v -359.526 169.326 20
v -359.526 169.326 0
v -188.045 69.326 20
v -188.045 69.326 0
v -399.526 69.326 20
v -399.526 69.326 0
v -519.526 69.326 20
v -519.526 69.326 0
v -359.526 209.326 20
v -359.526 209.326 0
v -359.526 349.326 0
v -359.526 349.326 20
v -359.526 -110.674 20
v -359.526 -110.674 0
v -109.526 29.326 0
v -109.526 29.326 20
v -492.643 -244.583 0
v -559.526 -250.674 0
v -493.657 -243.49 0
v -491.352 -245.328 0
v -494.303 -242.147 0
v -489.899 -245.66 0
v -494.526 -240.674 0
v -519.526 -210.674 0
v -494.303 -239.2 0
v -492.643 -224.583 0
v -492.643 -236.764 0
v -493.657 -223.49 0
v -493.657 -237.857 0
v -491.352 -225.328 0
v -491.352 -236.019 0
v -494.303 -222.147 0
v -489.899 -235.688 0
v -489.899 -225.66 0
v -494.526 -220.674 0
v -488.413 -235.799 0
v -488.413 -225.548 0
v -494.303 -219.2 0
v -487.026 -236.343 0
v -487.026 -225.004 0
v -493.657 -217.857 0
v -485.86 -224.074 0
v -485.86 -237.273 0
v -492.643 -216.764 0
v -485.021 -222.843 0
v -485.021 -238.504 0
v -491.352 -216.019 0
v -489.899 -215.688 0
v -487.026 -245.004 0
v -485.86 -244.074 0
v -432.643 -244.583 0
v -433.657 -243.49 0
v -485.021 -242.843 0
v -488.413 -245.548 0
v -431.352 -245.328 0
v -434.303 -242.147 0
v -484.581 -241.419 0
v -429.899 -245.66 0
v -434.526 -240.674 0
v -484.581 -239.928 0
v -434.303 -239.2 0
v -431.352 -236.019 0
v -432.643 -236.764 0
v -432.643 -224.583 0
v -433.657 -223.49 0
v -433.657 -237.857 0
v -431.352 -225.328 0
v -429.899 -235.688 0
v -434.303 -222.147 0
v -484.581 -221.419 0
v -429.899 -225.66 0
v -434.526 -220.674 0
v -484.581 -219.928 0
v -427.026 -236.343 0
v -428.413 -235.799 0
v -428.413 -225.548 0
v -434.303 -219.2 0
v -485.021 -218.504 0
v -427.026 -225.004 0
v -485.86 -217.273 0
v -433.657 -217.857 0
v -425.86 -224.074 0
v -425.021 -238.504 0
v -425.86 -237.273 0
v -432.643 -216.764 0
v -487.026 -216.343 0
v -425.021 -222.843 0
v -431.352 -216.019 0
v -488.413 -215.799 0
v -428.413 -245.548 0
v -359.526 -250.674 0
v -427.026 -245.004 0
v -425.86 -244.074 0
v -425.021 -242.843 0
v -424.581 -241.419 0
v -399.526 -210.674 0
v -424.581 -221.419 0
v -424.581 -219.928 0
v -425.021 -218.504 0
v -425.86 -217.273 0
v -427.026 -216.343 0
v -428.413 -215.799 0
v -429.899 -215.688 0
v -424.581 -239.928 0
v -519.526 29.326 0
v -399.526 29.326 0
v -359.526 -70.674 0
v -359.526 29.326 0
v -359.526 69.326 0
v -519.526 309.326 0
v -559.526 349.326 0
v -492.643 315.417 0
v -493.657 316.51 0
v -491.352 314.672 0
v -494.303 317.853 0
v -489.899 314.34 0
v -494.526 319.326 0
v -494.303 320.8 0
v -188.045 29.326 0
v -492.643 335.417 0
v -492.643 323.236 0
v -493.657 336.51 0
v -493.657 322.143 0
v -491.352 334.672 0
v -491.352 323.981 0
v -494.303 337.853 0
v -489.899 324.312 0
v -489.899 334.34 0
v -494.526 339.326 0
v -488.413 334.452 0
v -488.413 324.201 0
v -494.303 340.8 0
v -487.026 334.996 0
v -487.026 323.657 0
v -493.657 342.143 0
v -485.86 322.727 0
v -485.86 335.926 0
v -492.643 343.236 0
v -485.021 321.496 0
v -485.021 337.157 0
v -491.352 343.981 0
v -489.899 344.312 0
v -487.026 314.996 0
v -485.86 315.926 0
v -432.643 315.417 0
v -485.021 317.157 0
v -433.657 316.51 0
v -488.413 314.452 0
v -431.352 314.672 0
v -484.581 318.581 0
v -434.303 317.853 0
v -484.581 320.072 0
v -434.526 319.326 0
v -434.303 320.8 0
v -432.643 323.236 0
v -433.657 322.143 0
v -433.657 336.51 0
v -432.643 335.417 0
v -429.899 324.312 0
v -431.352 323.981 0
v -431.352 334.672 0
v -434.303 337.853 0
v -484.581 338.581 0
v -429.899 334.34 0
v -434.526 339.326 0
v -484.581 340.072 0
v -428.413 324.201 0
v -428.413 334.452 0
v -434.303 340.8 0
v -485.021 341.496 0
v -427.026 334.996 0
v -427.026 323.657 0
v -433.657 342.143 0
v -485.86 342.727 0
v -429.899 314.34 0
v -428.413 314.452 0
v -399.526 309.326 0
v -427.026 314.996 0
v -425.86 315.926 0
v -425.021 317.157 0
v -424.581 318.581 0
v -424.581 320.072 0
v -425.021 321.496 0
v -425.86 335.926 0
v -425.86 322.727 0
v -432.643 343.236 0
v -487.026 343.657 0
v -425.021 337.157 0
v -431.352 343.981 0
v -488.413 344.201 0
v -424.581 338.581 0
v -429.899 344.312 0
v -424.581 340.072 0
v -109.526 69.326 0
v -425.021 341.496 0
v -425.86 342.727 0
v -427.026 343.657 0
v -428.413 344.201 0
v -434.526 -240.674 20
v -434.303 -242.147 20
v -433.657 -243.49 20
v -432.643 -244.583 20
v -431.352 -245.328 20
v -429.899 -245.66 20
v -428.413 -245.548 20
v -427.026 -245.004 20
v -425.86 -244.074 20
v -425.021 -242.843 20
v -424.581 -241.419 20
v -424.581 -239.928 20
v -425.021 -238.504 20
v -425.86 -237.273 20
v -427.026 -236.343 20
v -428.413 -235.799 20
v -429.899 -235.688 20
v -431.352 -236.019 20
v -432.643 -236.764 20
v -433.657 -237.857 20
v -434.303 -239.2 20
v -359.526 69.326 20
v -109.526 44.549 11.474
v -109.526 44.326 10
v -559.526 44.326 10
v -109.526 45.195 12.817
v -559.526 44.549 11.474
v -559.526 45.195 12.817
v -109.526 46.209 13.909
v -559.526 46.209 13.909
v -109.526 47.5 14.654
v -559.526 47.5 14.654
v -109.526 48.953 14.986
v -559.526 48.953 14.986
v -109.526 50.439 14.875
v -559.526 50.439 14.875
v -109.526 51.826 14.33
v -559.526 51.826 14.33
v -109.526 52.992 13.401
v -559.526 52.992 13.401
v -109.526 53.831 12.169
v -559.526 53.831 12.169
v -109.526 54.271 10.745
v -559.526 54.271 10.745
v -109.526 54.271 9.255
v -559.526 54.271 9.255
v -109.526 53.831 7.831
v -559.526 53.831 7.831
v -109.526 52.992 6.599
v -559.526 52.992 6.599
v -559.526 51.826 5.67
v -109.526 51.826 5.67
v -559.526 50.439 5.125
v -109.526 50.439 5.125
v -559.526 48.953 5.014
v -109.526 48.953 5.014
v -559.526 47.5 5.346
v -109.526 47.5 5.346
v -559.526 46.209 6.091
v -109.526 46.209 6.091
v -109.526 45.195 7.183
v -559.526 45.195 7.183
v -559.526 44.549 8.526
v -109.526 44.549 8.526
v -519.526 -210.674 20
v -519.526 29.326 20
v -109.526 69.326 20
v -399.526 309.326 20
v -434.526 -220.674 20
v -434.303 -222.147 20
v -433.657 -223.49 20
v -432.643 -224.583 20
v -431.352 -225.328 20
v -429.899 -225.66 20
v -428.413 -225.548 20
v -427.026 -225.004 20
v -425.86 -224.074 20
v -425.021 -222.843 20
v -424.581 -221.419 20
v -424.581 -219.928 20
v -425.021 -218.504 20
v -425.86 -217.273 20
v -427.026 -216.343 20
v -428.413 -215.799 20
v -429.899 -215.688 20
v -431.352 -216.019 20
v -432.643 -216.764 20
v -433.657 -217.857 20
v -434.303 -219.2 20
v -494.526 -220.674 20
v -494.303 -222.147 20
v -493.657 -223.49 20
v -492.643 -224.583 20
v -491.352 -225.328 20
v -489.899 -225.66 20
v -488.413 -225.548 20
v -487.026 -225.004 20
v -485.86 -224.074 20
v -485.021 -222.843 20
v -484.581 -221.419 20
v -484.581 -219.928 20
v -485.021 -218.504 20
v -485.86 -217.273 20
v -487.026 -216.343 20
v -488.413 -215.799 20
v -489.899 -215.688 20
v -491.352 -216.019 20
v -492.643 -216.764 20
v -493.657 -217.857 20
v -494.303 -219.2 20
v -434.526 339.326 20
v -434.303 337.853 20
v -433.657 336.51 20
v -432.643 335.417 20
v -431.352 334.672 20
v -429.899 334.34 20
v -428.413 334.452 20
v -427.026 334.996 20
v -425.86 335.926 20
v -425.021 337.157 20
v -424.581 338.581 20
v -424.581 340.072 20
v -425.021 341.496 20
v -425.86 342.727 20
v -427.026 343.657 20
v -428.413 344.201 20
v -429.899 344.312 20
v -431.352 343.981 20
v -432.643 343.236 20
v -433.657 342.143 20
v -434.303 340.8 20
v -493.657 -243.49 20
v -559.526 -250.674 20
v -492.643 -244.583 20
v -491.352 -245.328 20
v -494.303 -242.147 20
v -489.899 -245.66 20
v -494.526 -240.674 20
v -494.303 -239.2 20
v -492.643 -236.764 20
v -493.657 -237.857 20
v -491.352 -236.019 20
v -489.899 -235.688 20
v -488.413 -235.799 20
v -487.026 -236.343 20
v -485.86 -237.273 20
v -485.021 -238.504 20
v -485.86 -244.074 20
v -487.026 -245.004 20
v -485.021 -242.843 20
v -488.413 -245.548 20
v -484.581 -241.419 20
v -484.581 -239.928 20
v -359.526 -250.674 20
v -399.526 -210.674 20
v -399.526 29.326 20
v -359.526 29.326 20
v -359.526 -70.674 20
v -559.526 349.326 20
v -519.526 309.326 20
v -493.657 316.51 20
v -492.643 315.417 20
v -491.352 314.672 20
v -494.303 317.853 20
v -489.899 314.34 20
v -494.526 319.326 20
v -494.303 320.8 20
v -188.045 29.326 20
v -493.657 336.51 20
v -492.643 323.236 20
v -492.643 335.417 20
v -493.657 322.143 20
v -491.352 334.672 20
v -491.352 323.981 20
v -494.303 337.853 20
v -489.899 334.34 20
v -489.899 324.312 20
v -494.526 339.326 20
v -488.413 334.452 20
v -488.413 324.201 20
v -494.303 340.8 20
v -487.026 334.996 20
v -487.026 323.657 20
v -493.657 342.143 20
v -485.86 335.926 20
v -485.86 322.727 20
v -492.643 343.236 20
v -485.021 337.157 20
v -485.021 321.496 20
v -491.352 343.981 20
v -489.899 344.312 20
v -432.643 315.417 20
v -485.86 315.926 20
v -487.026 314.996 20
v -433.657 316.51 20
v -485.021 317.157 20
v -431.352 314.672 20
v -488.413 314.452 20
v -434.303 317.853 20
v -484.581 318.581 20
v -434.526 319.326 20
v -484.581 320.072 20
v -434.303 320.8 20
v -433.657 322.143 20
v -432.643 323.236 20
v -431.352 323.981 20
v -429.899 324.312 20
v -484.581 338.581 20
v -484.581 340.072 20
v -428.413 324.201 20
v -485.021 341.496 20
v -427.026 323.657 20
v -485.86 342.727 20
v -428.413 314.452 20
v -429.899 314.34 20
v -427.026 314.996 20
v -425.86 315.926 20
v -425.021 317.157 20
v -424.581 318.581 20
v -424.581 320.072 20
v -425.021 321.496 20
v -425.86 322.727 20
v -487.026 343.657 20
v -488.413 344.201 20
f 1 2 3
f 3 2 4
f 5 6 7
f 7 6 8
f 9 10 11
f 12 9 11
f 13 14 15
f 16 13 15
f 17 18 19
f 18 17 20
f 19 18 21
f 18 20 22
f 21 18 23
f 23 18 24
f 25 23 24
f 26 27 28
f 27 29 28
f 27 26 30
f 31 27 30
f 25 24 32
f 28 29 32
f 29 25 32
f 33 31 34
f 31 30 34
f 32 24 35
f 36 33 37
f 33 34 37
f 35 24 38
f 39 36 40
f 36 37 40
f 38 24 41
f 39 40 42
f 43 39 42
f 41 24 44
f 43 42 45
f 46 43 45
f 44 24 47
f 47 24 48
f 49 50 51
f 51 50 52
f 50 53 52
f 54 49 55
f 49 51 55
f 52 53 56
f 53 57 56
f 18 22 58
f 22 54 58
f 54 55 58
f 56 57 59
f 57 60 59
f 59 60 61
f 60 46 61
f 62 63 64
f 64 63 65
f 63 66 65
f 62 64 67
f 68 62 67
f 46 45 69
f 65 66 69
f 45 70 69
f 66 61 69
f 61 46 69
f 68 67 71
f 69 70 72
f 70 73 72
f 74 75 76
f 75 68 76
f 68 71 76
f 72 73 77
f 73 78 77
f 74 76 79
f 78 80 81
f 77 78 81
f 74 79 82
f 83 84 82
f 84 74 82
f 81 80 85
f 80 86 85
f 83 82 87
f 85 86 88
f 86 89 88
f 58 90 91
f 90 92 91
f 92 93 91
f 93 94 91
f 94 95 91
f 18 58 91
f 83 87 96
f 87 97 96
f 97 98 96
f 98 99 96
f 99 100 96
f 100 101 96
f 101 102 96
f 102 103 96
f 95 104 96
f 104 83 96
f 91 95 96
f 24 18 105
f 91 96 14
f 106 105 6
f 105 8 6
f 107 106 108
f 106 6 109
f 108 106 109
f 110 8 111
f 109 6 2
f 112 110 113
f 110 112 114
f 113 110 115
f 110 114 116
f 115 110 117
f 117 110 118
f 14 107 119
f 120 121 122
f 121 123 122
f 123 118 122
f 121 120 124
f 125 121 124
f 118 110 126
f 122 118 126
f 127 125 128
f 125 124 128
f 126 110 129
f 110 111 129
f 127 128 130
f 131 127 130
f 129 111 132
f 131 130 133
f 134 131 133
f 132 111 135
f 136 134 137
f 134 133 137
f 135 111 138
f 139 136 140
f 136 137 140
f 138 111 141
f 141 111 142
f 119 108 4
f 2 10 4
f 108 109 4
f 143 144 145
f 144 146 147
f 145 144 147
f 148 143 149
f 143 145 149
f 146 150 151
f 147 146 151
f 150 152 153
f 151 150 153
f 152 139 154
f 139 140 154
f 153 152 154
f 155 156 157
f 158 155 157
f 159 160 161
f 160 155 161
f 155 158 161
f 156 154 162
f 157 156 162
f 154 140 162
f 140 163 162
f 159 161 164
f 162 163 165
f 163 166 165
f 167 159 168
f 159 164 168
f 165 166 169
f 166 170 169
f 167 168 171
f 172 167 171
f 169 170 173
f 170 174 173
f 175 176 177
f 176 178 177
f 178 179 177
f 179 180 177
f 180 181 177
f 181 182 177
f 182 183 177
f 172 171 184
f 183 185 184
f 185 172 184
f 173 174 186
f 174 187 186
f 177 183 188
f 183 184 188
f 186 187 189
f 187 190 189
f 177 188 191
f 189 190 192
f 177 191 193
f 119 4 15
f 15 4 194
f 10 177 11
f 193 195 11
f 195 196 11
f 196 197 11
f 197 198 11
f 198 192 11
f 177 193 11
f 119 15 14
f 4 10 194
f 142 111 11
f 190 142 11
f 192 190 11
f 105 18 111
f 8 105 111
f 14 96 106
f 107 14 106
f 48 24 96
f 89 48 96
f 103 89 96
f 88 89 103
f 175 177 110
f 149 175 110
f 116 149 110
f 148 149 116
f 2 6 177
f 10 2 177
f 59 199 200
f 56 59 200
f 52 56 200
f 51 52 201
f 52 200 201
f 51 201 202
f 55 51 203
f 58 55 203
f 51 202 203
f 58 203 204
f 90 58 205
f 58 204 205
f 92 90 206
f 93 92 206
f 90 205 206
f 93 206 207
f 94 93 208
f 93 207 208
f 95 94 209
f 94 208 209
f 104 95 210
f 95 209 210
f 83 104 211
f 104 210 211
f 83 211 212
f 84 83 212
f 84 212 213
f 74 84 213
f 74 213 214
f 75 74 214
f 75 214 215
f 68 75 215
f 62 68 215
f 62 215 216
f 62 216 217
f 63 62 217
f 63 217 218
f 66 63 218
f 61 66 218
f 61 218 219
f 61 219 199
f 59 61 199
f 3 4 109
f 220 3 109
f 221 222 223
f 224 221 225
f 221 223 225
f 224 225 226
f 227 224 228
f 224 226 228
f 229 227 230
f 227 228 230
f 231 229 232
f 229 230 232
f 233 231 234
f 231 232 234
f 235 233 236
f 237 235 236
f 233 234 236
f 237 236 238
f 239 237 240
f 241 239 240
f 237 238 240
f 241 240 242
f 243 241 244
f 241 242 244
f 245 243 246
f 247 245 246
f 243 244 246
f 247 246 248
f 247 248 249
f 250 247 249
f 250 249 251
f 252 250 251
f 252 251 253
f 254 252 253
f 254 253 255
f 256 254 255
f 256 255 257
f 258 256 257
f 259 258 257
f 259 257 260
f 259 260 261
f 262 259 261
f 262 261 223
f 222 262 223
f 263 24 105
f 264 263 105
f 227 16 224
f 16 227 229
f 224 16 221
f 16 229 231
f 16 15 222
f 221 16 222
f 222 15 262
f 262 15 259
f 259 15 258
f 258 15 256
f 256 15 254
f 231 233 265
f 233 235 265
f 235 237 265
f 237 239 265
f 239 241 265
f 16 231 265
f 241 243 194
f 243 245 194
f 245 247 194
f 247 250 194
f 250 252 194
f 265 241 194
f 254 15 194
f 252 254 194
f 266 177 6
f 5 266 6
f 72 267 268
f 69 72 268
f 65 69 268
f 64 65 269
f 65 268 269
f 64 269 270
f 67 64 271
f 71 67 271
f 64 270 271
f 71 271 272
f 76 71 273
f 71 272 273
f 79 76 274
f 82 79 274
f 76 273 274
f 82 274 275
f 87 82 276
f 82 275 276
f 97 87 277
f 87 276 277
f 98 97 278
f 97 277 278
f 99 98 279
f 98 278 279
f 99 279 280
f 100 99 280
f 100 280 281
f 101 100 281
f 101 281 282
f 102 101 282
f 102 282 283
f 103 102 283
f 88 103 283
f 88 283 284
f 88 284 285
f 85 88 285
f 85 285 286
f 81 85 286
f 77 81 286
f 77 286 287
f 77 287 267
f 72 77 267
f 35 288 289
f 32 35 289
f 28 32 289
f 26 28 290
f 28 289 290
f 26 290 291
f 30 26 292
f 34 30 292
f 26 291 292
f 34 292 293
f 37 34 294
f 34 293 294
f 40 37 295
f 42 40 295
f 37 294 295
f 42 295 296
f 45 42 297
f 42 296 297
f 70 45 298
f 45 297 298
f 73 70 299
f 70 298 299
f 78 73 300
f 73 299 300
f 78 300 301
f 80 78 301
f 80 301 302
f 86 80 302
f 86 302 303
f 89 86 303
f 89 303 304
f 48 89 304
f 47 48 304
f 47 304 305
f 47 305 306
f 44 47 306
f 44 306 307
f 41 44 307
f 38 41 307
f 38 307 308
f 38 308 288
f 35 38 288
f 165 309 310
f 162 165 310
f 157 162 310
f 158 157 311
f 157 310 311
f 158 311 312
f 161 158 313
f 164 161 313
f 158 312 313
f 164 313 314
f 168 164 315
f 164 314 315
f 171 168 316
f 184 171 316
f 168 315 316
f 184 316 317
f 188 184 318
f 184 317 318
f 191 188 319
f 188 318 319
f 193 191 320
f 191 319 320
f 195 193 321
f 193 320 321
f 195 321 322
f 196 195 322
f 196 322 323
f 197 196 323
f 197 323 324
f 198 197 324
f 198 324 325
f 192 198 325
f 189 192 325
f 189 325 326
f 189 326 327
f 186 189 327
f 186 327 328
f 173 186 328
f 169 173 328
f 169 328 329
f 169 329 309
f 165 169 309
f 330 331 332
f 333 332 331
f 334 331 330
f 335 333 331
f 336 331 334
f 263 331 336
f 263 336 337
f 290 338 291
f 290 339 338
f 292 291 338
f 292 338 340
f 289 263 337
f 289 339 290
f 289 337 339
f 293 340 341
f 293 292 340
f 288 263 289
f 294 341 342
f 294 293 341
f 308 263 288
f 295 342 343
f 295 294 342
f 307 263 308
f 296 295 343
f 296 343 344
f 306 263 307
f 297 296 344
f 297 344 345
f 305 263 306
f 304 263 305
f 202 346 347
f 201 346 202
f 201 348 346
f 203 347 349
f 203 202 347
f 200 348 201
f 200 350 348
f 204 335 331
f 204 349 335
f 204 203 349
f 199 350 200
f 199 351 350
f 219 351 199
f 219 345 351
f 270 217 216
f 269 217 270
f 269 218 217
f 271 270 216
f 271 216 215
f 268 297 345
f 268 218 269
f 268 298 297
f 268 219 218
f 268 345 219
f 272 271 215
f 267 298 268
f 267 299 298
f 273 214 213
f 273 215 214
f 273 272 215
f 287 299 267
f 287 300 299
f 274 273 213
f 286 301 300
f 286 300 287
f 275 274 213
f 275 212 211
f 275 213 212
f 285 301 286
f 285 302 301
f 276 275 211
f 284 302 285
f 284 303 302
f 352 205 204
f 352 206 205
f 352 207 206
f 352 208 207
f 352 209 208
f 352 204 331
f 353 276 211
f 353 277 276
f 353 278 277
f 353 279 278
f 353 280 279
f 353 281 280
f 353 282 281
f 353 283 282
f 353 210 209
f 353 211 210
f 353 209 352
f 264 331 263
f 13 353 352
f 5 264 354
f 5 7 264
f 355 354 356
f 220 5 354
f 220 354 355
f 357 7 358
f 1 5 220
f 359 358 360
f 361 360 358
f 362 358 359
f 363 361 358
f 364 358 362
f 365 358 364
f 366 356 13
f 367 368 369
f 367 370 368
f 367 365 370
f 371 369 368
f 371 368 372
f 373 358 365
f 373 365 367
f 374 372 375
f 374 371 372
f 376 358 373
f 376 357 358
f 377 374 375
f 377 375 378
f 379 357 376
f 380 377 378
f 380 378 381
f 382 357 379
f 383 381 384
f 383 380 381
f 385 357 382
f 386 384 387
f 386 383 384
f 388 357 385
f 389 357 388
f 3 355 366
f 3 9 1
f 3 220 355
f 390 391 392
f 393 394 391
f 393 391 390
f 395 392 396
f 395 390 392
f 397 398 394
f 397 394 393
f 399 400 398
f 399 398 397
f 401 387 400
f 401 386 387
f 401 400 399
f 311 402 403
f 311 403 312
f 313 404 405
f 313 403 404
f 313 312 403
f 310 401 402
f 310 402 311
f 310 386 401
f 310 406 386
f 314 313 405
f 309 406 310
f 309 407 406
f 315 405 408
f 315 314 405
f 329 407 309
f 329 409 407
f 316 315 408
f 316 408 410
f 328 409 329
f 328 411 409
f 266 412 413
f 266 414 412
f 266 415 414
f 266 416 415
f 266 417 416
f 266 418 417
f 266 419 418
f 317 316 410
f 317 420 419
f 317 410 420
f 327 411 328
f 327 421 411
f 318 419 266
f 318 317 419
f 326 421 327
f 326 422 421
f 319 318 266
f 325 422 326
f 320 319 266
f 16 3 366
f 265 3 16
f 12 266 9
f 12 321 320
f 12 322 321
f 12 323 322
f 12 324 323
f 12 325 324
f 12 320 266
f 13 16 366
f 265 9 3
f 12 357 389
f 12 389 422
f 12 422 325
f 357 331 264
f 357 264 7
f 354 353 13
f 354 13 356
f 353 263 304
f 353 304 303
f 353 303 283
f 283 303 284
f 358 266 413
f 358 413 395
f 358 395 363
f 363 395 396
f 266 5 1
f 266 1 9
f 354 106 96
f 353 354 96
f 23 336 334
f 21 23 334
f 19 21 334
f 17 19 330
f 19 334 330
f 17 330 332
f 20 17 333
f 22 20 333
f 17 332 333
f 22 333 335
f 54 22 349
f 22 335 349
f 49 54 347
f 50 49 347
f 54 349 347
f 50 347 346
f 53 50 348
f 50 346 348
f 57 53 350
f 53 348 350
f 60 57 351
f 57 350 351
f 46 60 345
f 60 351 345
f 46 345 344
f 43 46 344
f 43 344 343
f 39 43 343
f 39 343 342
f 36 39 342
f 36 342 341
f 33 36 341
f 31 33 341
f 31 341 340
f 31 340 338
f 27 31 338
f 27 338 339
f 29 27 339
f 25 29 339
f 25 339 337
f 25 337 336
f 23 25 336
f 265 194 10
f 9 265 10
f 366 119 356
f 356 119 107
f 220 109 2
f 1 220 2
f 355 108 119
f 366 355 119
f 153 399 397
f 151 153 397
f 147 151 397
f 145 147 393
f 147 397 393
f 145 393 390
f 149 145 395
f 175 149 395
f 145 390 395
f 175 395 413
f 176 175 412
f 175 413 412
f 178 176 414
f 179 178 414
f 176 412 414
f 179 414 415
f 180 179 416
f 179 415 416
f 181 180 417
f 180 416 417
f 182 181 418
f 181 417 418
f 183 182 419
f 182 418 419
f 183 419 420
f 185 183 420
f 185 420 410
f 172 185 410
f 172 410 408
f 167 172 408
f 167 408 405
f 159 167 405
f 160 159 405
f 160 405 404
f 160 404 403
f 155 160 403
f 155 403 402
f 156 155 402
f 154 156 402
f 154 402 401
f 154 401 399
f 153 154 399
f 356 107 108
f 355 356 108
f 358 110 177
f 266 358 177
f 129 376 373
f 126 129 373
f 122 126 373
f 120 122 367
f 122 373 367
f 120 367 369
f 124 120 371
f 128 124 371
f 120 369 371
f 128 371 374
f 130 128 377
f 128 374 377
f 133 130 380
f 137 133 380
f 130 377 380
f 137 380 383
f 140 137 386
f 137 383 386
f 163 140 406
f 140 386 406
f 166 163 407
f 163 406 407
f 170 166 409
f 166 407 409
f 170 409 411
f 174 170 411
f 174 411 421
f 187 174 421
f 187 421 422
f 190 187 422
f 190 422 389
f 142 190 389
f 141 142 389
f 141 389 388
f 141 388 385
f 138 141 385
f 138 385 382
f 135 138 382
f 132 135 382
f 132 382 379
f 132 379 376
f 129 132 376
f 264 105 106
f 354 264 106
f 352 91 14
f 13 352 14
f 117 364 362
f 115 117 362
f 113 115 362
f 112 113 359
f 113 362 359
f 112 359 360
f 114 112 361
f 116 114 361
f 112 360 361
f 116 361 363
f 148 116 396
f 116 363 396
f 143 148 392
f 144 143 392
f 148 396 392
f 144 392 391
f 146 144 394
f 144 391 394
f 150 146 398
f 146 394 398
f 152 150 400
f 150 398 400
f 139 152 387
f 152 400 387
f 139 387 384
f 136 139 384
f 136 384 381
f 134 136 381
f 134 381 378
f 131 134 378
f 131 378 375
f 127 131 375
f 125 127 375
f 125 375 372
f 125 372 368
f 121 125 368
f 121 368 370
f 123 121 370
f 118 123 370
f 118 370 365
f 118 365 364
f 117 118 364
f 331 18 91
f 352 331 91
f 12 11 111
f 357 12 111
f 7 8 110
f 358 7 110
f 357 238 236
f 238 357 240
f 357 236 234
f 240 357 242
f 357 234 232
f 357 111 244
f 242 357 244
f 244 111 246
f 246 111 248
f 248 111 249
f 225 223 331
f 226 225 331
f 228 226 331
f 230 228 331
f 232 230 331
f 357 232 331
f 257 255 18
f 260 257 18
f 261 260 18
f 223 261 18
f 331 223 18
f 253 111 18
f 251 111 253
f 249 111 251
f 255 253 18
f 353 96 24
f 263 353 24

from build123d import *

# Parameters (mm, degrees)
F1_DEPTH = 20
F2_D     = 10
F3_D     = 10
F0_W     = 120
F0_H     = 40
F0_W_2   = 40
F4_DEPTH = 20
F6_D     = 10


# Not quite as in the source:
# - a feature names something its author has since deleted; it is built from what else it names


with BuildPart() as f1:
    # F0 (on Top) → F1 (new body)
    with BuildSketch(Plane.XY):
        Polygon((-359.5256319247, 349.3264111251), (-559.5256319247, 349.3264111251), (-559.5256319247, -250.6735888749), (-359.5256319247, -250.6735888749), (-359.5256319247, -110.6735888749), (-359.5256319247, -70.6735888749), (-359.5256319247, 29.3264111251), (-399.5256319247, 29.3264111251), (-399.5256319247, -210.6735888749), (-519.5256319247, -210.6735888749), (-519.5256319247, 29.3264111251), (-519.5256319247, 69.3264111251), (-519.5256319247, 309.3264111251), (-399.5256319247, 309.3264111251), (-399.5256319247, 69.3264111251), (-359.5256319247, 69.3264111251), (-359.5256319247, 169.3264111251), (-359.5256319247, 209.3264111251), align=None)
    extrude(amount=F1_DEPTH)

    # F2 (through all)
    with Locations(Plane(origin=(0, 0, 0), x_dir=(1, 0, 0), z_dir=(0, 0, -1))):
        with Locations((-489.5256319247, -339.3264111251), (-429.5256319247, -319.3264111251), (-489.5256319247, -319.3264111251), (-489.5256319247, 220.6735888749), (-489.5256319247, 240.6735888749), (-429.5256319247, 240.6735888749), (-429.5256319247, 220.6735888749)):
            Hole(F2_D / 2)

    # F3 (through all)
    with Locations(Plane(origin=(0, 0, 0), x_dir=(1, 0, 0), z_dir=(0, 0, -1))):
        with Locations((-429.5256319247, -339.3264111251)):
            Hole(F3_D / 2)

    # F0 (on Top) → F4 (join)
    with BuildSketch(Plane.XY):
        with Locations((-459.5256319247, 49.3264111251)):
            Rectangle(F0_W, F0_H)
        with Locations((-379.5256319247, 49.3264111251)):
            Rectangle(F0_W_2, F0_H)
        Polygon((-109.5256319247, 29.3264111251), (-109.5256319247, 69.3264111251), (-188.0447282525, 69.3264111251), (-359.5256319247, 69.3264111251), (-359.5256319247, 29.3264111251), (-188.0447282525, 29.3264111251), align=None)
        Polygon((-109.5256319247, 69.3264111251), (-359.5256319247, 209.3264111251), (-359.5256319247, 169.3264111251), (-188.0447282525, 69.3264111251), align=None)
        Polygon((-359.5256319247, -70.6735888749), (-359.5256319247, -110.6735888749), (-109.5256319247, 29.3264111251), (-188.0447282525, 29.3264111251), align=None)
    extrude(amount=F4_DEPTH)

    # F6 (through all)
    with Locations(Plane.YZ.offset(-109.5256319247)):
        with Locations((49.3264111251, 10)):
            Hole(F6_D / 2)


solid = f1.part
